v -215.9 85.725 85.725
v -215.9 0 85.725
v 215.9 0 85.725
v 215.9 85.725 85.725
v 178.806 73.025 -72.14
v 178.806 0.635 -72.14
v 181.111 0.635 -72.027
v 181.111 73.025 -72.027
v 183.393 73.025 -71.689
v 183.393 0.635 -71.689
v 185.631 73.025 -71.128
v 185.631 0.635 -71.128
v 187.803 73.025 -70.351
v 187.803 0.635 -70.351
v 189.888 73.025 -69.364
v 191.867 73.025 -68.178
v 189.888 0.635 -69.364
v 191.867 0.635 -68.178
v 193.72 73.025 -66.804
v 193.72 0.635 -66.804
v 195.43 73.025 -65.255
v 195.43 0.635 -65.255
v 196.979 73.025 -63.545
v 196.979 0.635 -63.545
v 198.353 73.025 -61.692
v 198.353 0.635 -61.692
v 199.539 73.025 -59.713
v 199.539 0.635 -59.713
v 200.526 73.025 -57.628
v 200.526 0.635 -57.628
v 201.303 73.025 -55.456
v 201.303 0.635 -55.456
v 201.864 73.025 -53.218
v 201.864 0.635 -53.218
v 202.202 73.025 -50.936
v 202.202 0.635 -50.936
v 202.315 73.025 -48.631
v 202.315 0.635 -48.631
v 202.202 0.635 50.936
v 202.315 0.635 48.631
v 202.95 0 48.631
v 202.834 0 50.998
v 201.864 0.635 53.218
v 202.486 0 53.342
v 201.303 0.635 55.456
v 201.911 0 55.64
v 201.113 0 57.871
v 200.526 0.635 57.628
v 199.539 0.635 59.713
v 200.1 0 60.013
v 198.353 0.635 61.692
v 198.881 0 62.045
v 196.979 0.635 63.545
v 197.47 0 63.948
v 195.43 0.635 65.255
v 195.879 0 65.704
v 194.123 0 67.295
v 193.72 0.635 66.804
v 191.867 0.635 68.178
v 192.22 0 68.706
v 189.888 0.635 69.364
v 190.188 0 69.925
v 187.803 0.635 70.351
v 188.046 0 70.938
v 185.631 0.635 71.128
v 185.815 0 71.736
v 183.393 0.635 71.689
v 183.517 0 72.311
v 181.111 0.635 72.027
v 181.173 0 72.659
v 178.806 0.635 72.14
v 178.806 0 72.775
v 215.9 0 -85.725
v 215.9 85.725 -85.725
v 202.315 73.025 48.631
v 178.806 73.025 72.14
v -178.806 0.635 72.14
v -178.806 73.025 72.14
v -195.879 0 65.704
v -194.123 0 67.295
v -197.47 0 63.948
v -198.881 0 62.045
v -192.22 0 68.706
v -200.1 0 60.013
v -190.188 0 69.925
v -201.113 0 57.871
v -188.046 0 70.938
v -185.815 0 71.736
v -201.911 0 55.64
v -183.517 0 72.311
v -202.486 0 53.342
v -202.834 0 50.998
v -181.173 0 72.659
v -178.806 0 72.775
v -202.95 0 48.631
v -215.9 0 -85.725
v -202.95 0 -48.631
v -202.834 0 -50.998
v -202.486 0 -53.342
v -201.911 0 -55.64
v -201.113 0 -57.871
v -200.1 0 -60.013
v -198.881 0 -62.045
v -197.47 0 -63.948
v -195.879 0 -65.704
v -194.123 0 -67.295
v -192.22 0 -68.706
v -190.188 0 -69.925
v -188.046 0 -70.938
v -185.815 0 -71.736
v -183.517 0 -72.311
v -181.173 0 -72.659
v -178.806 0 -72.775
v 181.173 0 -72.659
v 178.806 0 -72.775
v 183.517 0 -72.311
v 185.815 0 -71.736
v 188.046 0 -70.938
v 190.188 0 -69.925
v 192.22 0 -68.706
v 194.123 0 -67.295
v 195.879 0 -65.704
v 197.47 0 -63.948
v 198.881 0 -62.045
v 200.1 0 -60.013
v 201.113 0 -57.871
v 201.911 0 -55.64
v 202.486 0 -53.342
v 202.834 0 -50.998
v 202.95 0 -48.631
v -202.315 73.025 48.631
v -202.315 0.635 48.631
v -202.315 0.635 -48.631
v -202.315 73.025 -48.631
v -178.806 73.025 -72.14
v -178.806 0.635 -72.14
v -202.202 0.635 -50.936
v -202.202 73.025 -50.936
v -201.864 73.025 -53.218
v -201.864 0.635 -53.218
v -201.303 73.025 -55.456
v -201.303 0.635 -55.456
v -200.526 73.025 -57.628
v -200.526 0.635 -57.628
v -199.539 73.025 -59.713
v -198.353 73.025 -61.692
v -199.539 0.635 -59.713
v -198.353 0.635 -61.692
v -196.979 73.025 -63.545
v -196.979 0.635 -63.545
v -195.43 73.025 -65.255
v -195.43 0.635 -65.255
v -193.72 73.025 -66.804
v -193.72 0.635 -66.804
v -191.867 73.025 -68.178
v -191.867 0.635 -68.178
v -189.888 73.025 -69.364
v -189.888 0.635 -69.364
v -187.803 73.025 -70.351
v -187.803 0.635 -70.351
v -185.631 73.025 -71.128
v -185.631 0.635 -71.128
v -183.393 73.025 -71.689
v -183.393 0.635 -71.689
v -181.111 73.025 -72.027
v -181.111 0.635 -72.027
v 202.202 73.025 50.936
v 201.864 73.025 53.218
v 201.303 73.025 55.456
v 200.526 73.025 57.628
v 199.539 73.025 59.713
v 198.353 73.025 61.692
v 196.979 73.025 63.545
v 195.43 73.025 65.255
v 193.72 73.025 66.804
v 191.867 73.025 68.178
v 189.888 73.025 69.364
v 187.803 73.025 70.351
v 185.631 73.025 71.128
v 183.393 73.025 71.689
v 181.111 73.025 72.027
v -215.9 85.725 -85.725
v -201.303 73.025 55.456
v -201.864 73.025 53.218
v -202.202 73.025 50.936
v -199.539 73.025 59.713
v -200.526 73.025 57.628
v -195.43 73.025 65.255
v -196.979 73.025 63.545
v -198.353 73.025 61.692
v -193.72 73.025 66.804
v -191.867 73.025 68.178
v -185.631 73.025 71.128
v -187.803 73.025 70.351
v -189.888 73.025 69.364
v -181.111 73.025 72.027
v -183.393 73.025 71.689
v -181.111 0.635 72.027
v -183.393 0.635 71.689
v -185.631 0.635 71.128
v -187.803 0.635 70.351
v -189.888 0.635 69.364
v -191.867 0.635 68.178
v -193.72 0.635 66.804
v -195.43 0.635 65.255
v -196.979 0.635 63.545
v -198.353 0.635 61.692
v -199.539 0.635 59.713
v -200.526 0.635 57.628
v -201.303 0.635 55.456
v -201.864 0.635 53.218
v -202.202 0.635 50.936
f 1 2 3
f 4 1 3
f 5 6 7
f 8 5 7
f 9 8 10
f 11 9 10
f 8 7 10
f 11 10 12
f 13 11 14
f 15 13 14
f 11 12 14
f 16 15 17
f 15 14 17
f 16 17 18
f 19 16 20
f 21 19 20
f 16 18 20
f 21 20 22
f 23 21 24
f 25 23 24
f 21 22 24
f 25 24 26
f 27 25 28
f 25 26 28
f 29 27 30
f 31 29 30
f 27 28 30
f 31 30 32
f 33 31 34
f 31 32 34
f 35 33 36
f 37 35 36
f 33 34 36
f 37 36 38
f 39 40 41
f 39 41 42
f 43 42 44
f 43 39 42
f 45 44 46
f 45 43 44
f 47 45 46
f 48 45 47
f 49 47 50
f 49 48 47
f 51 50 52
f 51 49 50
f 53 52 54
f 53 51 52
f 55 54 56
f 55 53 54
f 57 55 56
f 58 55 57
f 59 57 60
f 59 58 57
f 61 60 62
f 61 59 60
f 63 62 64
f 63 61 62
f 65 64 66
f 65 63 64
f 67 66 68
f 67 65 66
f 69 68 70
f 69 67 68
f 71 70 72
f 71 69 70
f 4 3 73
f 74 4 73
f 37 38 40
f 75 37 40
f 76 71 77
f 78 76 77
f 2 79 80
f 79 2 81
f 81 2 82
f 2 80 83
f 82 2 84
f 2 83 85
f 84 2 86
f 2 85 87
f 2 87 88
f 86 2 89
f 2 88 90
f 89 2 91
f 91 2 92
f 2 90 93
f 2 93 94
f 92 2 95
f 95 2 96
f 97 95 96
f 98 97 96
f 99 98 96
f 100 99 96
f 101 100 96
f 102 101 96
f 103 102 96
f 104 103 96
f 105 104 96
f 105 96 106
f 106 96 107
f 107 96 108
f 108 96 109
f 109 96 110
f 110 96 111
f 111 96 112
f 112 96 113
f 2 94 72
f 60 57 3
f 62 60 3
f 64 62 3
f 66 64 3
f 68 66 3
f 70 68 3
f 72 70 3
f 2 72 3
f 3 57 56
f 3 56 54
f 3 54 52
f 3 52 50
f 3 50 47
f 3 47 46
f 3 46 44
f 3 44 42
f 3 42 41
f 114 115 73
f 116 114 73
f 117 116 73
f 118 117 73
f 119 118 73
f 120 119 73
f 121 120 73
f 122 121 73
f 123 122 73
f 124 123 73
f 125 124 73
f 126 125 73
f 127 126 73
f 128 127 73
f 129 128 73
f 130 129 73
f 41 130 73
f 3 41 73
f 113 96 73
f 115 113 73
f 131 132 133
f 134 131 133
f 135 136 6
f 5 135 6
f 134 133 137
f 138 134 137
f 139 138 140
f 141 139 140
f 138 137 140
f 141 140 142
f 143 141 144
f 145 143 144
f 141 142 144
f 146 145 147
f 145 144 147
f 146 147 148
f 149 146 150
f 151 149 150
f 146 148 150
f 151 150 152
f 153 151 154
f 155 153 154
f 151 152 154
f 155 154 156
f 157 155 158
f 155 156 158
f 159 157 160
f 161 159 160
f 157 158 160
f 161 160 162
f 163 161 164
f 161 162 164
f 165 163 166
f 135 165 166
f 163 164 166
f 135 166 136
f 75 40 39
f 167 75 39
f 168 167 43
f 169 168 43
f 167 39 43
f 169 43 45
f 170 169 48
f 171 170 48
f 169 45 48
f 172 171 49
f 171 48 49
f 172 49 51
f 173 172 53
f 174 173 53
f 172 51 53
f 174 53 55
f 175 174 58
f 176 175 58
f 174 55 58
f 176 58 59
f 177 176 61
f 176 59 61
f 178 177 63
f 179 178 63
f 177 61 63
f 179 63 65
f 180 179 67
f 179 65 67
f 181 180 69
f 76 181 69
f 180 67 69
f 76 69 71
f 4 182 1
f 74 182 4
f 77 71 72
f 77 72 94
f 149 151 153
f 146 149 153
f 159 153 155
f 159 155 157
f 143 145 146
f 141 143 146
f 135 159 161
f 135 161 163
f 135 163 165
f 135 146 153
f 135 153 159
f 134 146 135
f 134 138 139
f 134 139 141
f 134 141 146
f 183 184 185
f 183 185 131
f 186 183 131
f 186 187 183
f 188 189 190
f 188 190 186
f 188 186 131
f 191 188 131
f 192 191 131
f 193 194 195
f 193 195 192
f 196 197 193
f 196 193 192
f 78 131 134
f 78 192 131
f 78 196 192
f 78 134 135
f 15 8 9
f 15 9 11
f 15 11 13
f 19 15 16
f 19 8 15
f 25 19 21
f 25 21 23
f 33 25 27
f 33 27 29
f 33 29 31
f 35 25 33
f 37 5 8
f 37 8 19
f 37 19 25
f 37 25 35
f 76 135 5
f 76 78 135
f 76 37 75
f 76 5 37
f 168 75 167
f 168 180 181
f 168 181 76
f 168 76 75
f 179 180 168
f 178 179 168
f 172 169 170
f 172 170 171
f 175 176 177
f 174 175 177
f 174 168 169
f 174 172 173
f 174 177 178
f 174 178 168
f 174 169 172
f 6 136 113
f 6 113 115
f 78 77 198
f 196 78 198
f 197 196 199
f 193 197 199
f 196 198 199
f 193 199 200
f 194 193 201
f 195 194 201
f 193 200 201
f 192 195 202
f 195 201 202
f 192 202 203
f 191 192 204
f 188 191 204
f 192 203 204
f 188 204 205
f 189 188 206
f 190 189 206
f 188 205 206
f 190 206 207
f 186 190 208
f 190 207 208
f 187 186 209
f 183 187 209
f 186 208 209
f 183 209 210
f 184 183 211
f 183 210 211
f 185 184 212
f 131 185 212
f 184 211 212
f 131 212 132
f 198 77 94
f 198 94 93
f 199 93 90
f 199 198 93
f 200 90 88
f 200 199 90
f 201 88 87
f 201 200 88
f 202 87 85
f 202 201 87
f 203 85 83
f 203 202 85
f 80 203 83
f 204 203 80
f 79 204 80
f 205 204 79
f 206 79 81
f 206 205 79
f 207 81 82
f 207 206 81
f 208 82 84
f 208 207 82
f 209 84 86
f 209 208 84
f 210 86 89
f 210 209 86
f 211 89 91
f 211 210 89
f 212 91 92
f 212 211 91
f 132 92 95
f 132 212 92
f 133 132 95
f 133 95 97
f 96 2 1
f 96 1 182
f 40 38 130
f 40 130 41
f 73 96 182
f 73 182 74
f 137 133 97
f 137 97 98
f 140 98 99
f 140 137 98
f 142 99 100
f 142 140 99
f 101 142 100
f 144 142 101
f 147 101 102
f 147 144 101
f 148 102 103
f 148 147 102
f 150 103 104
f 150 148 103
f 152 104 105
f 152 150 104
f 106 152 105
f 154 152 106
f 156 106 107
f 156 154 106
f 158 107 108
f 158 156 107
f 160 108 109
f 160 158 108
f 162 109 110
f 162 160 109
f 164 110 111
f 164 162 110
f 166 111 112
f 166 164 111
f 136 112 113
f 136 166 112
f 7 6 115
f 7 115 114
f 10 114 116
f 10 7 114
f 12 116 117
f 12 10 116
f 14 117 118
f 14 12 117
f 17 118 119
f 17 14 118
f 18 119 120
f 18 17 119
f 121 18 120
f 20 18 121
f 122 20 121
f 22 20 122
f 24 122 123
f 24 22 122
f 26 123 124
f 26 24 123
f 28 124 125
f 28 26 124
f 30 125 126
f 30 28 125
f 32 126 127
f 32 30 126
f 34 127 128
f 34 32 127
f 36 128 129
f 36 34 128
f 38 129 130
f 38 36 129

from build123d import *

# Parameters (mm, degrees)
SKETCH1_W           = 431.8
SKETCH1_H           = 171.45
BOSS_EXTRUDE1_DEPTH = 85.725
CUT_EXTRUDE1_DEPTH  = 73.025
CHAMFER1_SIZE       = 0.635


with BuildPart() as part:
    # Sketch1 → Boss-Extrude1 (new body)
    with BuildSketch(Plane(origin=(0, 0, 0), x_dir=(1, 0, 0), z_dir=(0, 1, 0))):
        Rectangle(SKETCH1_W, SKETCH1_H)
    extrude(amount=BOSS_EXTRUDE1_DEPTH)

    # Sketch2 → Cut-Extrude1 (cut)
    with BuildSketch(Plane.XZ):
        with BuildLine():
            Line((178.806416914, 72.140394915), (-178.806416914, 72.140394915))
            ThreePointArc((-178.806416914, 72.140394915), (-195.429774677, 65.254774677), (-202.315394915, 48.631416914))
            Line((-202.315394915, 48.631416914), (-202.315394915, -48.631416914))
            ThreePointArc((-202.315394915, -48.631416914), (-195.429774677, -65.254774677), (-178.806416914, -72.140394915))
            Line((-178.806416914, -72.140394915), (178.806416914, -72.140394915))
            ThreePointArc((178.806416914, -72.140394915), (195.429774677, -65.254774677), (202.315394915, -48.631416914))
            Line((202.315394915, -48.631416914), (202.315394915, 48.631416914))
            ThreePointArc((202.315394915, 48.631416914), (195.429774677, 65.254774677), (178.806416914, 72.140394915))
        make_face()
    extrude(amount=-CUT_EXTRUDE1_DEPTH, mode=Mode.SUBTRACT)

    # Chamfer1
    chamfer1_edges = [part.edges().sort_by_distance(p)[0] for p in [
        (195.429774677, 0, 65.254774677),
        (195.429774677, 0, -65.254774677),
        (-195.429774677, 0, -65.254774677),
        (0, 0, 72.140394915),
        (-195.429774677, 0, 65.254774677),
        (-202.315394915, 0, 0),
        (0, 0, -72.140394915),
        (202.315394915, 0, 0),
    ]]
    chamfer(chamfer1_edges, length=CHAMFER1_SIZE)


solid = part.part
